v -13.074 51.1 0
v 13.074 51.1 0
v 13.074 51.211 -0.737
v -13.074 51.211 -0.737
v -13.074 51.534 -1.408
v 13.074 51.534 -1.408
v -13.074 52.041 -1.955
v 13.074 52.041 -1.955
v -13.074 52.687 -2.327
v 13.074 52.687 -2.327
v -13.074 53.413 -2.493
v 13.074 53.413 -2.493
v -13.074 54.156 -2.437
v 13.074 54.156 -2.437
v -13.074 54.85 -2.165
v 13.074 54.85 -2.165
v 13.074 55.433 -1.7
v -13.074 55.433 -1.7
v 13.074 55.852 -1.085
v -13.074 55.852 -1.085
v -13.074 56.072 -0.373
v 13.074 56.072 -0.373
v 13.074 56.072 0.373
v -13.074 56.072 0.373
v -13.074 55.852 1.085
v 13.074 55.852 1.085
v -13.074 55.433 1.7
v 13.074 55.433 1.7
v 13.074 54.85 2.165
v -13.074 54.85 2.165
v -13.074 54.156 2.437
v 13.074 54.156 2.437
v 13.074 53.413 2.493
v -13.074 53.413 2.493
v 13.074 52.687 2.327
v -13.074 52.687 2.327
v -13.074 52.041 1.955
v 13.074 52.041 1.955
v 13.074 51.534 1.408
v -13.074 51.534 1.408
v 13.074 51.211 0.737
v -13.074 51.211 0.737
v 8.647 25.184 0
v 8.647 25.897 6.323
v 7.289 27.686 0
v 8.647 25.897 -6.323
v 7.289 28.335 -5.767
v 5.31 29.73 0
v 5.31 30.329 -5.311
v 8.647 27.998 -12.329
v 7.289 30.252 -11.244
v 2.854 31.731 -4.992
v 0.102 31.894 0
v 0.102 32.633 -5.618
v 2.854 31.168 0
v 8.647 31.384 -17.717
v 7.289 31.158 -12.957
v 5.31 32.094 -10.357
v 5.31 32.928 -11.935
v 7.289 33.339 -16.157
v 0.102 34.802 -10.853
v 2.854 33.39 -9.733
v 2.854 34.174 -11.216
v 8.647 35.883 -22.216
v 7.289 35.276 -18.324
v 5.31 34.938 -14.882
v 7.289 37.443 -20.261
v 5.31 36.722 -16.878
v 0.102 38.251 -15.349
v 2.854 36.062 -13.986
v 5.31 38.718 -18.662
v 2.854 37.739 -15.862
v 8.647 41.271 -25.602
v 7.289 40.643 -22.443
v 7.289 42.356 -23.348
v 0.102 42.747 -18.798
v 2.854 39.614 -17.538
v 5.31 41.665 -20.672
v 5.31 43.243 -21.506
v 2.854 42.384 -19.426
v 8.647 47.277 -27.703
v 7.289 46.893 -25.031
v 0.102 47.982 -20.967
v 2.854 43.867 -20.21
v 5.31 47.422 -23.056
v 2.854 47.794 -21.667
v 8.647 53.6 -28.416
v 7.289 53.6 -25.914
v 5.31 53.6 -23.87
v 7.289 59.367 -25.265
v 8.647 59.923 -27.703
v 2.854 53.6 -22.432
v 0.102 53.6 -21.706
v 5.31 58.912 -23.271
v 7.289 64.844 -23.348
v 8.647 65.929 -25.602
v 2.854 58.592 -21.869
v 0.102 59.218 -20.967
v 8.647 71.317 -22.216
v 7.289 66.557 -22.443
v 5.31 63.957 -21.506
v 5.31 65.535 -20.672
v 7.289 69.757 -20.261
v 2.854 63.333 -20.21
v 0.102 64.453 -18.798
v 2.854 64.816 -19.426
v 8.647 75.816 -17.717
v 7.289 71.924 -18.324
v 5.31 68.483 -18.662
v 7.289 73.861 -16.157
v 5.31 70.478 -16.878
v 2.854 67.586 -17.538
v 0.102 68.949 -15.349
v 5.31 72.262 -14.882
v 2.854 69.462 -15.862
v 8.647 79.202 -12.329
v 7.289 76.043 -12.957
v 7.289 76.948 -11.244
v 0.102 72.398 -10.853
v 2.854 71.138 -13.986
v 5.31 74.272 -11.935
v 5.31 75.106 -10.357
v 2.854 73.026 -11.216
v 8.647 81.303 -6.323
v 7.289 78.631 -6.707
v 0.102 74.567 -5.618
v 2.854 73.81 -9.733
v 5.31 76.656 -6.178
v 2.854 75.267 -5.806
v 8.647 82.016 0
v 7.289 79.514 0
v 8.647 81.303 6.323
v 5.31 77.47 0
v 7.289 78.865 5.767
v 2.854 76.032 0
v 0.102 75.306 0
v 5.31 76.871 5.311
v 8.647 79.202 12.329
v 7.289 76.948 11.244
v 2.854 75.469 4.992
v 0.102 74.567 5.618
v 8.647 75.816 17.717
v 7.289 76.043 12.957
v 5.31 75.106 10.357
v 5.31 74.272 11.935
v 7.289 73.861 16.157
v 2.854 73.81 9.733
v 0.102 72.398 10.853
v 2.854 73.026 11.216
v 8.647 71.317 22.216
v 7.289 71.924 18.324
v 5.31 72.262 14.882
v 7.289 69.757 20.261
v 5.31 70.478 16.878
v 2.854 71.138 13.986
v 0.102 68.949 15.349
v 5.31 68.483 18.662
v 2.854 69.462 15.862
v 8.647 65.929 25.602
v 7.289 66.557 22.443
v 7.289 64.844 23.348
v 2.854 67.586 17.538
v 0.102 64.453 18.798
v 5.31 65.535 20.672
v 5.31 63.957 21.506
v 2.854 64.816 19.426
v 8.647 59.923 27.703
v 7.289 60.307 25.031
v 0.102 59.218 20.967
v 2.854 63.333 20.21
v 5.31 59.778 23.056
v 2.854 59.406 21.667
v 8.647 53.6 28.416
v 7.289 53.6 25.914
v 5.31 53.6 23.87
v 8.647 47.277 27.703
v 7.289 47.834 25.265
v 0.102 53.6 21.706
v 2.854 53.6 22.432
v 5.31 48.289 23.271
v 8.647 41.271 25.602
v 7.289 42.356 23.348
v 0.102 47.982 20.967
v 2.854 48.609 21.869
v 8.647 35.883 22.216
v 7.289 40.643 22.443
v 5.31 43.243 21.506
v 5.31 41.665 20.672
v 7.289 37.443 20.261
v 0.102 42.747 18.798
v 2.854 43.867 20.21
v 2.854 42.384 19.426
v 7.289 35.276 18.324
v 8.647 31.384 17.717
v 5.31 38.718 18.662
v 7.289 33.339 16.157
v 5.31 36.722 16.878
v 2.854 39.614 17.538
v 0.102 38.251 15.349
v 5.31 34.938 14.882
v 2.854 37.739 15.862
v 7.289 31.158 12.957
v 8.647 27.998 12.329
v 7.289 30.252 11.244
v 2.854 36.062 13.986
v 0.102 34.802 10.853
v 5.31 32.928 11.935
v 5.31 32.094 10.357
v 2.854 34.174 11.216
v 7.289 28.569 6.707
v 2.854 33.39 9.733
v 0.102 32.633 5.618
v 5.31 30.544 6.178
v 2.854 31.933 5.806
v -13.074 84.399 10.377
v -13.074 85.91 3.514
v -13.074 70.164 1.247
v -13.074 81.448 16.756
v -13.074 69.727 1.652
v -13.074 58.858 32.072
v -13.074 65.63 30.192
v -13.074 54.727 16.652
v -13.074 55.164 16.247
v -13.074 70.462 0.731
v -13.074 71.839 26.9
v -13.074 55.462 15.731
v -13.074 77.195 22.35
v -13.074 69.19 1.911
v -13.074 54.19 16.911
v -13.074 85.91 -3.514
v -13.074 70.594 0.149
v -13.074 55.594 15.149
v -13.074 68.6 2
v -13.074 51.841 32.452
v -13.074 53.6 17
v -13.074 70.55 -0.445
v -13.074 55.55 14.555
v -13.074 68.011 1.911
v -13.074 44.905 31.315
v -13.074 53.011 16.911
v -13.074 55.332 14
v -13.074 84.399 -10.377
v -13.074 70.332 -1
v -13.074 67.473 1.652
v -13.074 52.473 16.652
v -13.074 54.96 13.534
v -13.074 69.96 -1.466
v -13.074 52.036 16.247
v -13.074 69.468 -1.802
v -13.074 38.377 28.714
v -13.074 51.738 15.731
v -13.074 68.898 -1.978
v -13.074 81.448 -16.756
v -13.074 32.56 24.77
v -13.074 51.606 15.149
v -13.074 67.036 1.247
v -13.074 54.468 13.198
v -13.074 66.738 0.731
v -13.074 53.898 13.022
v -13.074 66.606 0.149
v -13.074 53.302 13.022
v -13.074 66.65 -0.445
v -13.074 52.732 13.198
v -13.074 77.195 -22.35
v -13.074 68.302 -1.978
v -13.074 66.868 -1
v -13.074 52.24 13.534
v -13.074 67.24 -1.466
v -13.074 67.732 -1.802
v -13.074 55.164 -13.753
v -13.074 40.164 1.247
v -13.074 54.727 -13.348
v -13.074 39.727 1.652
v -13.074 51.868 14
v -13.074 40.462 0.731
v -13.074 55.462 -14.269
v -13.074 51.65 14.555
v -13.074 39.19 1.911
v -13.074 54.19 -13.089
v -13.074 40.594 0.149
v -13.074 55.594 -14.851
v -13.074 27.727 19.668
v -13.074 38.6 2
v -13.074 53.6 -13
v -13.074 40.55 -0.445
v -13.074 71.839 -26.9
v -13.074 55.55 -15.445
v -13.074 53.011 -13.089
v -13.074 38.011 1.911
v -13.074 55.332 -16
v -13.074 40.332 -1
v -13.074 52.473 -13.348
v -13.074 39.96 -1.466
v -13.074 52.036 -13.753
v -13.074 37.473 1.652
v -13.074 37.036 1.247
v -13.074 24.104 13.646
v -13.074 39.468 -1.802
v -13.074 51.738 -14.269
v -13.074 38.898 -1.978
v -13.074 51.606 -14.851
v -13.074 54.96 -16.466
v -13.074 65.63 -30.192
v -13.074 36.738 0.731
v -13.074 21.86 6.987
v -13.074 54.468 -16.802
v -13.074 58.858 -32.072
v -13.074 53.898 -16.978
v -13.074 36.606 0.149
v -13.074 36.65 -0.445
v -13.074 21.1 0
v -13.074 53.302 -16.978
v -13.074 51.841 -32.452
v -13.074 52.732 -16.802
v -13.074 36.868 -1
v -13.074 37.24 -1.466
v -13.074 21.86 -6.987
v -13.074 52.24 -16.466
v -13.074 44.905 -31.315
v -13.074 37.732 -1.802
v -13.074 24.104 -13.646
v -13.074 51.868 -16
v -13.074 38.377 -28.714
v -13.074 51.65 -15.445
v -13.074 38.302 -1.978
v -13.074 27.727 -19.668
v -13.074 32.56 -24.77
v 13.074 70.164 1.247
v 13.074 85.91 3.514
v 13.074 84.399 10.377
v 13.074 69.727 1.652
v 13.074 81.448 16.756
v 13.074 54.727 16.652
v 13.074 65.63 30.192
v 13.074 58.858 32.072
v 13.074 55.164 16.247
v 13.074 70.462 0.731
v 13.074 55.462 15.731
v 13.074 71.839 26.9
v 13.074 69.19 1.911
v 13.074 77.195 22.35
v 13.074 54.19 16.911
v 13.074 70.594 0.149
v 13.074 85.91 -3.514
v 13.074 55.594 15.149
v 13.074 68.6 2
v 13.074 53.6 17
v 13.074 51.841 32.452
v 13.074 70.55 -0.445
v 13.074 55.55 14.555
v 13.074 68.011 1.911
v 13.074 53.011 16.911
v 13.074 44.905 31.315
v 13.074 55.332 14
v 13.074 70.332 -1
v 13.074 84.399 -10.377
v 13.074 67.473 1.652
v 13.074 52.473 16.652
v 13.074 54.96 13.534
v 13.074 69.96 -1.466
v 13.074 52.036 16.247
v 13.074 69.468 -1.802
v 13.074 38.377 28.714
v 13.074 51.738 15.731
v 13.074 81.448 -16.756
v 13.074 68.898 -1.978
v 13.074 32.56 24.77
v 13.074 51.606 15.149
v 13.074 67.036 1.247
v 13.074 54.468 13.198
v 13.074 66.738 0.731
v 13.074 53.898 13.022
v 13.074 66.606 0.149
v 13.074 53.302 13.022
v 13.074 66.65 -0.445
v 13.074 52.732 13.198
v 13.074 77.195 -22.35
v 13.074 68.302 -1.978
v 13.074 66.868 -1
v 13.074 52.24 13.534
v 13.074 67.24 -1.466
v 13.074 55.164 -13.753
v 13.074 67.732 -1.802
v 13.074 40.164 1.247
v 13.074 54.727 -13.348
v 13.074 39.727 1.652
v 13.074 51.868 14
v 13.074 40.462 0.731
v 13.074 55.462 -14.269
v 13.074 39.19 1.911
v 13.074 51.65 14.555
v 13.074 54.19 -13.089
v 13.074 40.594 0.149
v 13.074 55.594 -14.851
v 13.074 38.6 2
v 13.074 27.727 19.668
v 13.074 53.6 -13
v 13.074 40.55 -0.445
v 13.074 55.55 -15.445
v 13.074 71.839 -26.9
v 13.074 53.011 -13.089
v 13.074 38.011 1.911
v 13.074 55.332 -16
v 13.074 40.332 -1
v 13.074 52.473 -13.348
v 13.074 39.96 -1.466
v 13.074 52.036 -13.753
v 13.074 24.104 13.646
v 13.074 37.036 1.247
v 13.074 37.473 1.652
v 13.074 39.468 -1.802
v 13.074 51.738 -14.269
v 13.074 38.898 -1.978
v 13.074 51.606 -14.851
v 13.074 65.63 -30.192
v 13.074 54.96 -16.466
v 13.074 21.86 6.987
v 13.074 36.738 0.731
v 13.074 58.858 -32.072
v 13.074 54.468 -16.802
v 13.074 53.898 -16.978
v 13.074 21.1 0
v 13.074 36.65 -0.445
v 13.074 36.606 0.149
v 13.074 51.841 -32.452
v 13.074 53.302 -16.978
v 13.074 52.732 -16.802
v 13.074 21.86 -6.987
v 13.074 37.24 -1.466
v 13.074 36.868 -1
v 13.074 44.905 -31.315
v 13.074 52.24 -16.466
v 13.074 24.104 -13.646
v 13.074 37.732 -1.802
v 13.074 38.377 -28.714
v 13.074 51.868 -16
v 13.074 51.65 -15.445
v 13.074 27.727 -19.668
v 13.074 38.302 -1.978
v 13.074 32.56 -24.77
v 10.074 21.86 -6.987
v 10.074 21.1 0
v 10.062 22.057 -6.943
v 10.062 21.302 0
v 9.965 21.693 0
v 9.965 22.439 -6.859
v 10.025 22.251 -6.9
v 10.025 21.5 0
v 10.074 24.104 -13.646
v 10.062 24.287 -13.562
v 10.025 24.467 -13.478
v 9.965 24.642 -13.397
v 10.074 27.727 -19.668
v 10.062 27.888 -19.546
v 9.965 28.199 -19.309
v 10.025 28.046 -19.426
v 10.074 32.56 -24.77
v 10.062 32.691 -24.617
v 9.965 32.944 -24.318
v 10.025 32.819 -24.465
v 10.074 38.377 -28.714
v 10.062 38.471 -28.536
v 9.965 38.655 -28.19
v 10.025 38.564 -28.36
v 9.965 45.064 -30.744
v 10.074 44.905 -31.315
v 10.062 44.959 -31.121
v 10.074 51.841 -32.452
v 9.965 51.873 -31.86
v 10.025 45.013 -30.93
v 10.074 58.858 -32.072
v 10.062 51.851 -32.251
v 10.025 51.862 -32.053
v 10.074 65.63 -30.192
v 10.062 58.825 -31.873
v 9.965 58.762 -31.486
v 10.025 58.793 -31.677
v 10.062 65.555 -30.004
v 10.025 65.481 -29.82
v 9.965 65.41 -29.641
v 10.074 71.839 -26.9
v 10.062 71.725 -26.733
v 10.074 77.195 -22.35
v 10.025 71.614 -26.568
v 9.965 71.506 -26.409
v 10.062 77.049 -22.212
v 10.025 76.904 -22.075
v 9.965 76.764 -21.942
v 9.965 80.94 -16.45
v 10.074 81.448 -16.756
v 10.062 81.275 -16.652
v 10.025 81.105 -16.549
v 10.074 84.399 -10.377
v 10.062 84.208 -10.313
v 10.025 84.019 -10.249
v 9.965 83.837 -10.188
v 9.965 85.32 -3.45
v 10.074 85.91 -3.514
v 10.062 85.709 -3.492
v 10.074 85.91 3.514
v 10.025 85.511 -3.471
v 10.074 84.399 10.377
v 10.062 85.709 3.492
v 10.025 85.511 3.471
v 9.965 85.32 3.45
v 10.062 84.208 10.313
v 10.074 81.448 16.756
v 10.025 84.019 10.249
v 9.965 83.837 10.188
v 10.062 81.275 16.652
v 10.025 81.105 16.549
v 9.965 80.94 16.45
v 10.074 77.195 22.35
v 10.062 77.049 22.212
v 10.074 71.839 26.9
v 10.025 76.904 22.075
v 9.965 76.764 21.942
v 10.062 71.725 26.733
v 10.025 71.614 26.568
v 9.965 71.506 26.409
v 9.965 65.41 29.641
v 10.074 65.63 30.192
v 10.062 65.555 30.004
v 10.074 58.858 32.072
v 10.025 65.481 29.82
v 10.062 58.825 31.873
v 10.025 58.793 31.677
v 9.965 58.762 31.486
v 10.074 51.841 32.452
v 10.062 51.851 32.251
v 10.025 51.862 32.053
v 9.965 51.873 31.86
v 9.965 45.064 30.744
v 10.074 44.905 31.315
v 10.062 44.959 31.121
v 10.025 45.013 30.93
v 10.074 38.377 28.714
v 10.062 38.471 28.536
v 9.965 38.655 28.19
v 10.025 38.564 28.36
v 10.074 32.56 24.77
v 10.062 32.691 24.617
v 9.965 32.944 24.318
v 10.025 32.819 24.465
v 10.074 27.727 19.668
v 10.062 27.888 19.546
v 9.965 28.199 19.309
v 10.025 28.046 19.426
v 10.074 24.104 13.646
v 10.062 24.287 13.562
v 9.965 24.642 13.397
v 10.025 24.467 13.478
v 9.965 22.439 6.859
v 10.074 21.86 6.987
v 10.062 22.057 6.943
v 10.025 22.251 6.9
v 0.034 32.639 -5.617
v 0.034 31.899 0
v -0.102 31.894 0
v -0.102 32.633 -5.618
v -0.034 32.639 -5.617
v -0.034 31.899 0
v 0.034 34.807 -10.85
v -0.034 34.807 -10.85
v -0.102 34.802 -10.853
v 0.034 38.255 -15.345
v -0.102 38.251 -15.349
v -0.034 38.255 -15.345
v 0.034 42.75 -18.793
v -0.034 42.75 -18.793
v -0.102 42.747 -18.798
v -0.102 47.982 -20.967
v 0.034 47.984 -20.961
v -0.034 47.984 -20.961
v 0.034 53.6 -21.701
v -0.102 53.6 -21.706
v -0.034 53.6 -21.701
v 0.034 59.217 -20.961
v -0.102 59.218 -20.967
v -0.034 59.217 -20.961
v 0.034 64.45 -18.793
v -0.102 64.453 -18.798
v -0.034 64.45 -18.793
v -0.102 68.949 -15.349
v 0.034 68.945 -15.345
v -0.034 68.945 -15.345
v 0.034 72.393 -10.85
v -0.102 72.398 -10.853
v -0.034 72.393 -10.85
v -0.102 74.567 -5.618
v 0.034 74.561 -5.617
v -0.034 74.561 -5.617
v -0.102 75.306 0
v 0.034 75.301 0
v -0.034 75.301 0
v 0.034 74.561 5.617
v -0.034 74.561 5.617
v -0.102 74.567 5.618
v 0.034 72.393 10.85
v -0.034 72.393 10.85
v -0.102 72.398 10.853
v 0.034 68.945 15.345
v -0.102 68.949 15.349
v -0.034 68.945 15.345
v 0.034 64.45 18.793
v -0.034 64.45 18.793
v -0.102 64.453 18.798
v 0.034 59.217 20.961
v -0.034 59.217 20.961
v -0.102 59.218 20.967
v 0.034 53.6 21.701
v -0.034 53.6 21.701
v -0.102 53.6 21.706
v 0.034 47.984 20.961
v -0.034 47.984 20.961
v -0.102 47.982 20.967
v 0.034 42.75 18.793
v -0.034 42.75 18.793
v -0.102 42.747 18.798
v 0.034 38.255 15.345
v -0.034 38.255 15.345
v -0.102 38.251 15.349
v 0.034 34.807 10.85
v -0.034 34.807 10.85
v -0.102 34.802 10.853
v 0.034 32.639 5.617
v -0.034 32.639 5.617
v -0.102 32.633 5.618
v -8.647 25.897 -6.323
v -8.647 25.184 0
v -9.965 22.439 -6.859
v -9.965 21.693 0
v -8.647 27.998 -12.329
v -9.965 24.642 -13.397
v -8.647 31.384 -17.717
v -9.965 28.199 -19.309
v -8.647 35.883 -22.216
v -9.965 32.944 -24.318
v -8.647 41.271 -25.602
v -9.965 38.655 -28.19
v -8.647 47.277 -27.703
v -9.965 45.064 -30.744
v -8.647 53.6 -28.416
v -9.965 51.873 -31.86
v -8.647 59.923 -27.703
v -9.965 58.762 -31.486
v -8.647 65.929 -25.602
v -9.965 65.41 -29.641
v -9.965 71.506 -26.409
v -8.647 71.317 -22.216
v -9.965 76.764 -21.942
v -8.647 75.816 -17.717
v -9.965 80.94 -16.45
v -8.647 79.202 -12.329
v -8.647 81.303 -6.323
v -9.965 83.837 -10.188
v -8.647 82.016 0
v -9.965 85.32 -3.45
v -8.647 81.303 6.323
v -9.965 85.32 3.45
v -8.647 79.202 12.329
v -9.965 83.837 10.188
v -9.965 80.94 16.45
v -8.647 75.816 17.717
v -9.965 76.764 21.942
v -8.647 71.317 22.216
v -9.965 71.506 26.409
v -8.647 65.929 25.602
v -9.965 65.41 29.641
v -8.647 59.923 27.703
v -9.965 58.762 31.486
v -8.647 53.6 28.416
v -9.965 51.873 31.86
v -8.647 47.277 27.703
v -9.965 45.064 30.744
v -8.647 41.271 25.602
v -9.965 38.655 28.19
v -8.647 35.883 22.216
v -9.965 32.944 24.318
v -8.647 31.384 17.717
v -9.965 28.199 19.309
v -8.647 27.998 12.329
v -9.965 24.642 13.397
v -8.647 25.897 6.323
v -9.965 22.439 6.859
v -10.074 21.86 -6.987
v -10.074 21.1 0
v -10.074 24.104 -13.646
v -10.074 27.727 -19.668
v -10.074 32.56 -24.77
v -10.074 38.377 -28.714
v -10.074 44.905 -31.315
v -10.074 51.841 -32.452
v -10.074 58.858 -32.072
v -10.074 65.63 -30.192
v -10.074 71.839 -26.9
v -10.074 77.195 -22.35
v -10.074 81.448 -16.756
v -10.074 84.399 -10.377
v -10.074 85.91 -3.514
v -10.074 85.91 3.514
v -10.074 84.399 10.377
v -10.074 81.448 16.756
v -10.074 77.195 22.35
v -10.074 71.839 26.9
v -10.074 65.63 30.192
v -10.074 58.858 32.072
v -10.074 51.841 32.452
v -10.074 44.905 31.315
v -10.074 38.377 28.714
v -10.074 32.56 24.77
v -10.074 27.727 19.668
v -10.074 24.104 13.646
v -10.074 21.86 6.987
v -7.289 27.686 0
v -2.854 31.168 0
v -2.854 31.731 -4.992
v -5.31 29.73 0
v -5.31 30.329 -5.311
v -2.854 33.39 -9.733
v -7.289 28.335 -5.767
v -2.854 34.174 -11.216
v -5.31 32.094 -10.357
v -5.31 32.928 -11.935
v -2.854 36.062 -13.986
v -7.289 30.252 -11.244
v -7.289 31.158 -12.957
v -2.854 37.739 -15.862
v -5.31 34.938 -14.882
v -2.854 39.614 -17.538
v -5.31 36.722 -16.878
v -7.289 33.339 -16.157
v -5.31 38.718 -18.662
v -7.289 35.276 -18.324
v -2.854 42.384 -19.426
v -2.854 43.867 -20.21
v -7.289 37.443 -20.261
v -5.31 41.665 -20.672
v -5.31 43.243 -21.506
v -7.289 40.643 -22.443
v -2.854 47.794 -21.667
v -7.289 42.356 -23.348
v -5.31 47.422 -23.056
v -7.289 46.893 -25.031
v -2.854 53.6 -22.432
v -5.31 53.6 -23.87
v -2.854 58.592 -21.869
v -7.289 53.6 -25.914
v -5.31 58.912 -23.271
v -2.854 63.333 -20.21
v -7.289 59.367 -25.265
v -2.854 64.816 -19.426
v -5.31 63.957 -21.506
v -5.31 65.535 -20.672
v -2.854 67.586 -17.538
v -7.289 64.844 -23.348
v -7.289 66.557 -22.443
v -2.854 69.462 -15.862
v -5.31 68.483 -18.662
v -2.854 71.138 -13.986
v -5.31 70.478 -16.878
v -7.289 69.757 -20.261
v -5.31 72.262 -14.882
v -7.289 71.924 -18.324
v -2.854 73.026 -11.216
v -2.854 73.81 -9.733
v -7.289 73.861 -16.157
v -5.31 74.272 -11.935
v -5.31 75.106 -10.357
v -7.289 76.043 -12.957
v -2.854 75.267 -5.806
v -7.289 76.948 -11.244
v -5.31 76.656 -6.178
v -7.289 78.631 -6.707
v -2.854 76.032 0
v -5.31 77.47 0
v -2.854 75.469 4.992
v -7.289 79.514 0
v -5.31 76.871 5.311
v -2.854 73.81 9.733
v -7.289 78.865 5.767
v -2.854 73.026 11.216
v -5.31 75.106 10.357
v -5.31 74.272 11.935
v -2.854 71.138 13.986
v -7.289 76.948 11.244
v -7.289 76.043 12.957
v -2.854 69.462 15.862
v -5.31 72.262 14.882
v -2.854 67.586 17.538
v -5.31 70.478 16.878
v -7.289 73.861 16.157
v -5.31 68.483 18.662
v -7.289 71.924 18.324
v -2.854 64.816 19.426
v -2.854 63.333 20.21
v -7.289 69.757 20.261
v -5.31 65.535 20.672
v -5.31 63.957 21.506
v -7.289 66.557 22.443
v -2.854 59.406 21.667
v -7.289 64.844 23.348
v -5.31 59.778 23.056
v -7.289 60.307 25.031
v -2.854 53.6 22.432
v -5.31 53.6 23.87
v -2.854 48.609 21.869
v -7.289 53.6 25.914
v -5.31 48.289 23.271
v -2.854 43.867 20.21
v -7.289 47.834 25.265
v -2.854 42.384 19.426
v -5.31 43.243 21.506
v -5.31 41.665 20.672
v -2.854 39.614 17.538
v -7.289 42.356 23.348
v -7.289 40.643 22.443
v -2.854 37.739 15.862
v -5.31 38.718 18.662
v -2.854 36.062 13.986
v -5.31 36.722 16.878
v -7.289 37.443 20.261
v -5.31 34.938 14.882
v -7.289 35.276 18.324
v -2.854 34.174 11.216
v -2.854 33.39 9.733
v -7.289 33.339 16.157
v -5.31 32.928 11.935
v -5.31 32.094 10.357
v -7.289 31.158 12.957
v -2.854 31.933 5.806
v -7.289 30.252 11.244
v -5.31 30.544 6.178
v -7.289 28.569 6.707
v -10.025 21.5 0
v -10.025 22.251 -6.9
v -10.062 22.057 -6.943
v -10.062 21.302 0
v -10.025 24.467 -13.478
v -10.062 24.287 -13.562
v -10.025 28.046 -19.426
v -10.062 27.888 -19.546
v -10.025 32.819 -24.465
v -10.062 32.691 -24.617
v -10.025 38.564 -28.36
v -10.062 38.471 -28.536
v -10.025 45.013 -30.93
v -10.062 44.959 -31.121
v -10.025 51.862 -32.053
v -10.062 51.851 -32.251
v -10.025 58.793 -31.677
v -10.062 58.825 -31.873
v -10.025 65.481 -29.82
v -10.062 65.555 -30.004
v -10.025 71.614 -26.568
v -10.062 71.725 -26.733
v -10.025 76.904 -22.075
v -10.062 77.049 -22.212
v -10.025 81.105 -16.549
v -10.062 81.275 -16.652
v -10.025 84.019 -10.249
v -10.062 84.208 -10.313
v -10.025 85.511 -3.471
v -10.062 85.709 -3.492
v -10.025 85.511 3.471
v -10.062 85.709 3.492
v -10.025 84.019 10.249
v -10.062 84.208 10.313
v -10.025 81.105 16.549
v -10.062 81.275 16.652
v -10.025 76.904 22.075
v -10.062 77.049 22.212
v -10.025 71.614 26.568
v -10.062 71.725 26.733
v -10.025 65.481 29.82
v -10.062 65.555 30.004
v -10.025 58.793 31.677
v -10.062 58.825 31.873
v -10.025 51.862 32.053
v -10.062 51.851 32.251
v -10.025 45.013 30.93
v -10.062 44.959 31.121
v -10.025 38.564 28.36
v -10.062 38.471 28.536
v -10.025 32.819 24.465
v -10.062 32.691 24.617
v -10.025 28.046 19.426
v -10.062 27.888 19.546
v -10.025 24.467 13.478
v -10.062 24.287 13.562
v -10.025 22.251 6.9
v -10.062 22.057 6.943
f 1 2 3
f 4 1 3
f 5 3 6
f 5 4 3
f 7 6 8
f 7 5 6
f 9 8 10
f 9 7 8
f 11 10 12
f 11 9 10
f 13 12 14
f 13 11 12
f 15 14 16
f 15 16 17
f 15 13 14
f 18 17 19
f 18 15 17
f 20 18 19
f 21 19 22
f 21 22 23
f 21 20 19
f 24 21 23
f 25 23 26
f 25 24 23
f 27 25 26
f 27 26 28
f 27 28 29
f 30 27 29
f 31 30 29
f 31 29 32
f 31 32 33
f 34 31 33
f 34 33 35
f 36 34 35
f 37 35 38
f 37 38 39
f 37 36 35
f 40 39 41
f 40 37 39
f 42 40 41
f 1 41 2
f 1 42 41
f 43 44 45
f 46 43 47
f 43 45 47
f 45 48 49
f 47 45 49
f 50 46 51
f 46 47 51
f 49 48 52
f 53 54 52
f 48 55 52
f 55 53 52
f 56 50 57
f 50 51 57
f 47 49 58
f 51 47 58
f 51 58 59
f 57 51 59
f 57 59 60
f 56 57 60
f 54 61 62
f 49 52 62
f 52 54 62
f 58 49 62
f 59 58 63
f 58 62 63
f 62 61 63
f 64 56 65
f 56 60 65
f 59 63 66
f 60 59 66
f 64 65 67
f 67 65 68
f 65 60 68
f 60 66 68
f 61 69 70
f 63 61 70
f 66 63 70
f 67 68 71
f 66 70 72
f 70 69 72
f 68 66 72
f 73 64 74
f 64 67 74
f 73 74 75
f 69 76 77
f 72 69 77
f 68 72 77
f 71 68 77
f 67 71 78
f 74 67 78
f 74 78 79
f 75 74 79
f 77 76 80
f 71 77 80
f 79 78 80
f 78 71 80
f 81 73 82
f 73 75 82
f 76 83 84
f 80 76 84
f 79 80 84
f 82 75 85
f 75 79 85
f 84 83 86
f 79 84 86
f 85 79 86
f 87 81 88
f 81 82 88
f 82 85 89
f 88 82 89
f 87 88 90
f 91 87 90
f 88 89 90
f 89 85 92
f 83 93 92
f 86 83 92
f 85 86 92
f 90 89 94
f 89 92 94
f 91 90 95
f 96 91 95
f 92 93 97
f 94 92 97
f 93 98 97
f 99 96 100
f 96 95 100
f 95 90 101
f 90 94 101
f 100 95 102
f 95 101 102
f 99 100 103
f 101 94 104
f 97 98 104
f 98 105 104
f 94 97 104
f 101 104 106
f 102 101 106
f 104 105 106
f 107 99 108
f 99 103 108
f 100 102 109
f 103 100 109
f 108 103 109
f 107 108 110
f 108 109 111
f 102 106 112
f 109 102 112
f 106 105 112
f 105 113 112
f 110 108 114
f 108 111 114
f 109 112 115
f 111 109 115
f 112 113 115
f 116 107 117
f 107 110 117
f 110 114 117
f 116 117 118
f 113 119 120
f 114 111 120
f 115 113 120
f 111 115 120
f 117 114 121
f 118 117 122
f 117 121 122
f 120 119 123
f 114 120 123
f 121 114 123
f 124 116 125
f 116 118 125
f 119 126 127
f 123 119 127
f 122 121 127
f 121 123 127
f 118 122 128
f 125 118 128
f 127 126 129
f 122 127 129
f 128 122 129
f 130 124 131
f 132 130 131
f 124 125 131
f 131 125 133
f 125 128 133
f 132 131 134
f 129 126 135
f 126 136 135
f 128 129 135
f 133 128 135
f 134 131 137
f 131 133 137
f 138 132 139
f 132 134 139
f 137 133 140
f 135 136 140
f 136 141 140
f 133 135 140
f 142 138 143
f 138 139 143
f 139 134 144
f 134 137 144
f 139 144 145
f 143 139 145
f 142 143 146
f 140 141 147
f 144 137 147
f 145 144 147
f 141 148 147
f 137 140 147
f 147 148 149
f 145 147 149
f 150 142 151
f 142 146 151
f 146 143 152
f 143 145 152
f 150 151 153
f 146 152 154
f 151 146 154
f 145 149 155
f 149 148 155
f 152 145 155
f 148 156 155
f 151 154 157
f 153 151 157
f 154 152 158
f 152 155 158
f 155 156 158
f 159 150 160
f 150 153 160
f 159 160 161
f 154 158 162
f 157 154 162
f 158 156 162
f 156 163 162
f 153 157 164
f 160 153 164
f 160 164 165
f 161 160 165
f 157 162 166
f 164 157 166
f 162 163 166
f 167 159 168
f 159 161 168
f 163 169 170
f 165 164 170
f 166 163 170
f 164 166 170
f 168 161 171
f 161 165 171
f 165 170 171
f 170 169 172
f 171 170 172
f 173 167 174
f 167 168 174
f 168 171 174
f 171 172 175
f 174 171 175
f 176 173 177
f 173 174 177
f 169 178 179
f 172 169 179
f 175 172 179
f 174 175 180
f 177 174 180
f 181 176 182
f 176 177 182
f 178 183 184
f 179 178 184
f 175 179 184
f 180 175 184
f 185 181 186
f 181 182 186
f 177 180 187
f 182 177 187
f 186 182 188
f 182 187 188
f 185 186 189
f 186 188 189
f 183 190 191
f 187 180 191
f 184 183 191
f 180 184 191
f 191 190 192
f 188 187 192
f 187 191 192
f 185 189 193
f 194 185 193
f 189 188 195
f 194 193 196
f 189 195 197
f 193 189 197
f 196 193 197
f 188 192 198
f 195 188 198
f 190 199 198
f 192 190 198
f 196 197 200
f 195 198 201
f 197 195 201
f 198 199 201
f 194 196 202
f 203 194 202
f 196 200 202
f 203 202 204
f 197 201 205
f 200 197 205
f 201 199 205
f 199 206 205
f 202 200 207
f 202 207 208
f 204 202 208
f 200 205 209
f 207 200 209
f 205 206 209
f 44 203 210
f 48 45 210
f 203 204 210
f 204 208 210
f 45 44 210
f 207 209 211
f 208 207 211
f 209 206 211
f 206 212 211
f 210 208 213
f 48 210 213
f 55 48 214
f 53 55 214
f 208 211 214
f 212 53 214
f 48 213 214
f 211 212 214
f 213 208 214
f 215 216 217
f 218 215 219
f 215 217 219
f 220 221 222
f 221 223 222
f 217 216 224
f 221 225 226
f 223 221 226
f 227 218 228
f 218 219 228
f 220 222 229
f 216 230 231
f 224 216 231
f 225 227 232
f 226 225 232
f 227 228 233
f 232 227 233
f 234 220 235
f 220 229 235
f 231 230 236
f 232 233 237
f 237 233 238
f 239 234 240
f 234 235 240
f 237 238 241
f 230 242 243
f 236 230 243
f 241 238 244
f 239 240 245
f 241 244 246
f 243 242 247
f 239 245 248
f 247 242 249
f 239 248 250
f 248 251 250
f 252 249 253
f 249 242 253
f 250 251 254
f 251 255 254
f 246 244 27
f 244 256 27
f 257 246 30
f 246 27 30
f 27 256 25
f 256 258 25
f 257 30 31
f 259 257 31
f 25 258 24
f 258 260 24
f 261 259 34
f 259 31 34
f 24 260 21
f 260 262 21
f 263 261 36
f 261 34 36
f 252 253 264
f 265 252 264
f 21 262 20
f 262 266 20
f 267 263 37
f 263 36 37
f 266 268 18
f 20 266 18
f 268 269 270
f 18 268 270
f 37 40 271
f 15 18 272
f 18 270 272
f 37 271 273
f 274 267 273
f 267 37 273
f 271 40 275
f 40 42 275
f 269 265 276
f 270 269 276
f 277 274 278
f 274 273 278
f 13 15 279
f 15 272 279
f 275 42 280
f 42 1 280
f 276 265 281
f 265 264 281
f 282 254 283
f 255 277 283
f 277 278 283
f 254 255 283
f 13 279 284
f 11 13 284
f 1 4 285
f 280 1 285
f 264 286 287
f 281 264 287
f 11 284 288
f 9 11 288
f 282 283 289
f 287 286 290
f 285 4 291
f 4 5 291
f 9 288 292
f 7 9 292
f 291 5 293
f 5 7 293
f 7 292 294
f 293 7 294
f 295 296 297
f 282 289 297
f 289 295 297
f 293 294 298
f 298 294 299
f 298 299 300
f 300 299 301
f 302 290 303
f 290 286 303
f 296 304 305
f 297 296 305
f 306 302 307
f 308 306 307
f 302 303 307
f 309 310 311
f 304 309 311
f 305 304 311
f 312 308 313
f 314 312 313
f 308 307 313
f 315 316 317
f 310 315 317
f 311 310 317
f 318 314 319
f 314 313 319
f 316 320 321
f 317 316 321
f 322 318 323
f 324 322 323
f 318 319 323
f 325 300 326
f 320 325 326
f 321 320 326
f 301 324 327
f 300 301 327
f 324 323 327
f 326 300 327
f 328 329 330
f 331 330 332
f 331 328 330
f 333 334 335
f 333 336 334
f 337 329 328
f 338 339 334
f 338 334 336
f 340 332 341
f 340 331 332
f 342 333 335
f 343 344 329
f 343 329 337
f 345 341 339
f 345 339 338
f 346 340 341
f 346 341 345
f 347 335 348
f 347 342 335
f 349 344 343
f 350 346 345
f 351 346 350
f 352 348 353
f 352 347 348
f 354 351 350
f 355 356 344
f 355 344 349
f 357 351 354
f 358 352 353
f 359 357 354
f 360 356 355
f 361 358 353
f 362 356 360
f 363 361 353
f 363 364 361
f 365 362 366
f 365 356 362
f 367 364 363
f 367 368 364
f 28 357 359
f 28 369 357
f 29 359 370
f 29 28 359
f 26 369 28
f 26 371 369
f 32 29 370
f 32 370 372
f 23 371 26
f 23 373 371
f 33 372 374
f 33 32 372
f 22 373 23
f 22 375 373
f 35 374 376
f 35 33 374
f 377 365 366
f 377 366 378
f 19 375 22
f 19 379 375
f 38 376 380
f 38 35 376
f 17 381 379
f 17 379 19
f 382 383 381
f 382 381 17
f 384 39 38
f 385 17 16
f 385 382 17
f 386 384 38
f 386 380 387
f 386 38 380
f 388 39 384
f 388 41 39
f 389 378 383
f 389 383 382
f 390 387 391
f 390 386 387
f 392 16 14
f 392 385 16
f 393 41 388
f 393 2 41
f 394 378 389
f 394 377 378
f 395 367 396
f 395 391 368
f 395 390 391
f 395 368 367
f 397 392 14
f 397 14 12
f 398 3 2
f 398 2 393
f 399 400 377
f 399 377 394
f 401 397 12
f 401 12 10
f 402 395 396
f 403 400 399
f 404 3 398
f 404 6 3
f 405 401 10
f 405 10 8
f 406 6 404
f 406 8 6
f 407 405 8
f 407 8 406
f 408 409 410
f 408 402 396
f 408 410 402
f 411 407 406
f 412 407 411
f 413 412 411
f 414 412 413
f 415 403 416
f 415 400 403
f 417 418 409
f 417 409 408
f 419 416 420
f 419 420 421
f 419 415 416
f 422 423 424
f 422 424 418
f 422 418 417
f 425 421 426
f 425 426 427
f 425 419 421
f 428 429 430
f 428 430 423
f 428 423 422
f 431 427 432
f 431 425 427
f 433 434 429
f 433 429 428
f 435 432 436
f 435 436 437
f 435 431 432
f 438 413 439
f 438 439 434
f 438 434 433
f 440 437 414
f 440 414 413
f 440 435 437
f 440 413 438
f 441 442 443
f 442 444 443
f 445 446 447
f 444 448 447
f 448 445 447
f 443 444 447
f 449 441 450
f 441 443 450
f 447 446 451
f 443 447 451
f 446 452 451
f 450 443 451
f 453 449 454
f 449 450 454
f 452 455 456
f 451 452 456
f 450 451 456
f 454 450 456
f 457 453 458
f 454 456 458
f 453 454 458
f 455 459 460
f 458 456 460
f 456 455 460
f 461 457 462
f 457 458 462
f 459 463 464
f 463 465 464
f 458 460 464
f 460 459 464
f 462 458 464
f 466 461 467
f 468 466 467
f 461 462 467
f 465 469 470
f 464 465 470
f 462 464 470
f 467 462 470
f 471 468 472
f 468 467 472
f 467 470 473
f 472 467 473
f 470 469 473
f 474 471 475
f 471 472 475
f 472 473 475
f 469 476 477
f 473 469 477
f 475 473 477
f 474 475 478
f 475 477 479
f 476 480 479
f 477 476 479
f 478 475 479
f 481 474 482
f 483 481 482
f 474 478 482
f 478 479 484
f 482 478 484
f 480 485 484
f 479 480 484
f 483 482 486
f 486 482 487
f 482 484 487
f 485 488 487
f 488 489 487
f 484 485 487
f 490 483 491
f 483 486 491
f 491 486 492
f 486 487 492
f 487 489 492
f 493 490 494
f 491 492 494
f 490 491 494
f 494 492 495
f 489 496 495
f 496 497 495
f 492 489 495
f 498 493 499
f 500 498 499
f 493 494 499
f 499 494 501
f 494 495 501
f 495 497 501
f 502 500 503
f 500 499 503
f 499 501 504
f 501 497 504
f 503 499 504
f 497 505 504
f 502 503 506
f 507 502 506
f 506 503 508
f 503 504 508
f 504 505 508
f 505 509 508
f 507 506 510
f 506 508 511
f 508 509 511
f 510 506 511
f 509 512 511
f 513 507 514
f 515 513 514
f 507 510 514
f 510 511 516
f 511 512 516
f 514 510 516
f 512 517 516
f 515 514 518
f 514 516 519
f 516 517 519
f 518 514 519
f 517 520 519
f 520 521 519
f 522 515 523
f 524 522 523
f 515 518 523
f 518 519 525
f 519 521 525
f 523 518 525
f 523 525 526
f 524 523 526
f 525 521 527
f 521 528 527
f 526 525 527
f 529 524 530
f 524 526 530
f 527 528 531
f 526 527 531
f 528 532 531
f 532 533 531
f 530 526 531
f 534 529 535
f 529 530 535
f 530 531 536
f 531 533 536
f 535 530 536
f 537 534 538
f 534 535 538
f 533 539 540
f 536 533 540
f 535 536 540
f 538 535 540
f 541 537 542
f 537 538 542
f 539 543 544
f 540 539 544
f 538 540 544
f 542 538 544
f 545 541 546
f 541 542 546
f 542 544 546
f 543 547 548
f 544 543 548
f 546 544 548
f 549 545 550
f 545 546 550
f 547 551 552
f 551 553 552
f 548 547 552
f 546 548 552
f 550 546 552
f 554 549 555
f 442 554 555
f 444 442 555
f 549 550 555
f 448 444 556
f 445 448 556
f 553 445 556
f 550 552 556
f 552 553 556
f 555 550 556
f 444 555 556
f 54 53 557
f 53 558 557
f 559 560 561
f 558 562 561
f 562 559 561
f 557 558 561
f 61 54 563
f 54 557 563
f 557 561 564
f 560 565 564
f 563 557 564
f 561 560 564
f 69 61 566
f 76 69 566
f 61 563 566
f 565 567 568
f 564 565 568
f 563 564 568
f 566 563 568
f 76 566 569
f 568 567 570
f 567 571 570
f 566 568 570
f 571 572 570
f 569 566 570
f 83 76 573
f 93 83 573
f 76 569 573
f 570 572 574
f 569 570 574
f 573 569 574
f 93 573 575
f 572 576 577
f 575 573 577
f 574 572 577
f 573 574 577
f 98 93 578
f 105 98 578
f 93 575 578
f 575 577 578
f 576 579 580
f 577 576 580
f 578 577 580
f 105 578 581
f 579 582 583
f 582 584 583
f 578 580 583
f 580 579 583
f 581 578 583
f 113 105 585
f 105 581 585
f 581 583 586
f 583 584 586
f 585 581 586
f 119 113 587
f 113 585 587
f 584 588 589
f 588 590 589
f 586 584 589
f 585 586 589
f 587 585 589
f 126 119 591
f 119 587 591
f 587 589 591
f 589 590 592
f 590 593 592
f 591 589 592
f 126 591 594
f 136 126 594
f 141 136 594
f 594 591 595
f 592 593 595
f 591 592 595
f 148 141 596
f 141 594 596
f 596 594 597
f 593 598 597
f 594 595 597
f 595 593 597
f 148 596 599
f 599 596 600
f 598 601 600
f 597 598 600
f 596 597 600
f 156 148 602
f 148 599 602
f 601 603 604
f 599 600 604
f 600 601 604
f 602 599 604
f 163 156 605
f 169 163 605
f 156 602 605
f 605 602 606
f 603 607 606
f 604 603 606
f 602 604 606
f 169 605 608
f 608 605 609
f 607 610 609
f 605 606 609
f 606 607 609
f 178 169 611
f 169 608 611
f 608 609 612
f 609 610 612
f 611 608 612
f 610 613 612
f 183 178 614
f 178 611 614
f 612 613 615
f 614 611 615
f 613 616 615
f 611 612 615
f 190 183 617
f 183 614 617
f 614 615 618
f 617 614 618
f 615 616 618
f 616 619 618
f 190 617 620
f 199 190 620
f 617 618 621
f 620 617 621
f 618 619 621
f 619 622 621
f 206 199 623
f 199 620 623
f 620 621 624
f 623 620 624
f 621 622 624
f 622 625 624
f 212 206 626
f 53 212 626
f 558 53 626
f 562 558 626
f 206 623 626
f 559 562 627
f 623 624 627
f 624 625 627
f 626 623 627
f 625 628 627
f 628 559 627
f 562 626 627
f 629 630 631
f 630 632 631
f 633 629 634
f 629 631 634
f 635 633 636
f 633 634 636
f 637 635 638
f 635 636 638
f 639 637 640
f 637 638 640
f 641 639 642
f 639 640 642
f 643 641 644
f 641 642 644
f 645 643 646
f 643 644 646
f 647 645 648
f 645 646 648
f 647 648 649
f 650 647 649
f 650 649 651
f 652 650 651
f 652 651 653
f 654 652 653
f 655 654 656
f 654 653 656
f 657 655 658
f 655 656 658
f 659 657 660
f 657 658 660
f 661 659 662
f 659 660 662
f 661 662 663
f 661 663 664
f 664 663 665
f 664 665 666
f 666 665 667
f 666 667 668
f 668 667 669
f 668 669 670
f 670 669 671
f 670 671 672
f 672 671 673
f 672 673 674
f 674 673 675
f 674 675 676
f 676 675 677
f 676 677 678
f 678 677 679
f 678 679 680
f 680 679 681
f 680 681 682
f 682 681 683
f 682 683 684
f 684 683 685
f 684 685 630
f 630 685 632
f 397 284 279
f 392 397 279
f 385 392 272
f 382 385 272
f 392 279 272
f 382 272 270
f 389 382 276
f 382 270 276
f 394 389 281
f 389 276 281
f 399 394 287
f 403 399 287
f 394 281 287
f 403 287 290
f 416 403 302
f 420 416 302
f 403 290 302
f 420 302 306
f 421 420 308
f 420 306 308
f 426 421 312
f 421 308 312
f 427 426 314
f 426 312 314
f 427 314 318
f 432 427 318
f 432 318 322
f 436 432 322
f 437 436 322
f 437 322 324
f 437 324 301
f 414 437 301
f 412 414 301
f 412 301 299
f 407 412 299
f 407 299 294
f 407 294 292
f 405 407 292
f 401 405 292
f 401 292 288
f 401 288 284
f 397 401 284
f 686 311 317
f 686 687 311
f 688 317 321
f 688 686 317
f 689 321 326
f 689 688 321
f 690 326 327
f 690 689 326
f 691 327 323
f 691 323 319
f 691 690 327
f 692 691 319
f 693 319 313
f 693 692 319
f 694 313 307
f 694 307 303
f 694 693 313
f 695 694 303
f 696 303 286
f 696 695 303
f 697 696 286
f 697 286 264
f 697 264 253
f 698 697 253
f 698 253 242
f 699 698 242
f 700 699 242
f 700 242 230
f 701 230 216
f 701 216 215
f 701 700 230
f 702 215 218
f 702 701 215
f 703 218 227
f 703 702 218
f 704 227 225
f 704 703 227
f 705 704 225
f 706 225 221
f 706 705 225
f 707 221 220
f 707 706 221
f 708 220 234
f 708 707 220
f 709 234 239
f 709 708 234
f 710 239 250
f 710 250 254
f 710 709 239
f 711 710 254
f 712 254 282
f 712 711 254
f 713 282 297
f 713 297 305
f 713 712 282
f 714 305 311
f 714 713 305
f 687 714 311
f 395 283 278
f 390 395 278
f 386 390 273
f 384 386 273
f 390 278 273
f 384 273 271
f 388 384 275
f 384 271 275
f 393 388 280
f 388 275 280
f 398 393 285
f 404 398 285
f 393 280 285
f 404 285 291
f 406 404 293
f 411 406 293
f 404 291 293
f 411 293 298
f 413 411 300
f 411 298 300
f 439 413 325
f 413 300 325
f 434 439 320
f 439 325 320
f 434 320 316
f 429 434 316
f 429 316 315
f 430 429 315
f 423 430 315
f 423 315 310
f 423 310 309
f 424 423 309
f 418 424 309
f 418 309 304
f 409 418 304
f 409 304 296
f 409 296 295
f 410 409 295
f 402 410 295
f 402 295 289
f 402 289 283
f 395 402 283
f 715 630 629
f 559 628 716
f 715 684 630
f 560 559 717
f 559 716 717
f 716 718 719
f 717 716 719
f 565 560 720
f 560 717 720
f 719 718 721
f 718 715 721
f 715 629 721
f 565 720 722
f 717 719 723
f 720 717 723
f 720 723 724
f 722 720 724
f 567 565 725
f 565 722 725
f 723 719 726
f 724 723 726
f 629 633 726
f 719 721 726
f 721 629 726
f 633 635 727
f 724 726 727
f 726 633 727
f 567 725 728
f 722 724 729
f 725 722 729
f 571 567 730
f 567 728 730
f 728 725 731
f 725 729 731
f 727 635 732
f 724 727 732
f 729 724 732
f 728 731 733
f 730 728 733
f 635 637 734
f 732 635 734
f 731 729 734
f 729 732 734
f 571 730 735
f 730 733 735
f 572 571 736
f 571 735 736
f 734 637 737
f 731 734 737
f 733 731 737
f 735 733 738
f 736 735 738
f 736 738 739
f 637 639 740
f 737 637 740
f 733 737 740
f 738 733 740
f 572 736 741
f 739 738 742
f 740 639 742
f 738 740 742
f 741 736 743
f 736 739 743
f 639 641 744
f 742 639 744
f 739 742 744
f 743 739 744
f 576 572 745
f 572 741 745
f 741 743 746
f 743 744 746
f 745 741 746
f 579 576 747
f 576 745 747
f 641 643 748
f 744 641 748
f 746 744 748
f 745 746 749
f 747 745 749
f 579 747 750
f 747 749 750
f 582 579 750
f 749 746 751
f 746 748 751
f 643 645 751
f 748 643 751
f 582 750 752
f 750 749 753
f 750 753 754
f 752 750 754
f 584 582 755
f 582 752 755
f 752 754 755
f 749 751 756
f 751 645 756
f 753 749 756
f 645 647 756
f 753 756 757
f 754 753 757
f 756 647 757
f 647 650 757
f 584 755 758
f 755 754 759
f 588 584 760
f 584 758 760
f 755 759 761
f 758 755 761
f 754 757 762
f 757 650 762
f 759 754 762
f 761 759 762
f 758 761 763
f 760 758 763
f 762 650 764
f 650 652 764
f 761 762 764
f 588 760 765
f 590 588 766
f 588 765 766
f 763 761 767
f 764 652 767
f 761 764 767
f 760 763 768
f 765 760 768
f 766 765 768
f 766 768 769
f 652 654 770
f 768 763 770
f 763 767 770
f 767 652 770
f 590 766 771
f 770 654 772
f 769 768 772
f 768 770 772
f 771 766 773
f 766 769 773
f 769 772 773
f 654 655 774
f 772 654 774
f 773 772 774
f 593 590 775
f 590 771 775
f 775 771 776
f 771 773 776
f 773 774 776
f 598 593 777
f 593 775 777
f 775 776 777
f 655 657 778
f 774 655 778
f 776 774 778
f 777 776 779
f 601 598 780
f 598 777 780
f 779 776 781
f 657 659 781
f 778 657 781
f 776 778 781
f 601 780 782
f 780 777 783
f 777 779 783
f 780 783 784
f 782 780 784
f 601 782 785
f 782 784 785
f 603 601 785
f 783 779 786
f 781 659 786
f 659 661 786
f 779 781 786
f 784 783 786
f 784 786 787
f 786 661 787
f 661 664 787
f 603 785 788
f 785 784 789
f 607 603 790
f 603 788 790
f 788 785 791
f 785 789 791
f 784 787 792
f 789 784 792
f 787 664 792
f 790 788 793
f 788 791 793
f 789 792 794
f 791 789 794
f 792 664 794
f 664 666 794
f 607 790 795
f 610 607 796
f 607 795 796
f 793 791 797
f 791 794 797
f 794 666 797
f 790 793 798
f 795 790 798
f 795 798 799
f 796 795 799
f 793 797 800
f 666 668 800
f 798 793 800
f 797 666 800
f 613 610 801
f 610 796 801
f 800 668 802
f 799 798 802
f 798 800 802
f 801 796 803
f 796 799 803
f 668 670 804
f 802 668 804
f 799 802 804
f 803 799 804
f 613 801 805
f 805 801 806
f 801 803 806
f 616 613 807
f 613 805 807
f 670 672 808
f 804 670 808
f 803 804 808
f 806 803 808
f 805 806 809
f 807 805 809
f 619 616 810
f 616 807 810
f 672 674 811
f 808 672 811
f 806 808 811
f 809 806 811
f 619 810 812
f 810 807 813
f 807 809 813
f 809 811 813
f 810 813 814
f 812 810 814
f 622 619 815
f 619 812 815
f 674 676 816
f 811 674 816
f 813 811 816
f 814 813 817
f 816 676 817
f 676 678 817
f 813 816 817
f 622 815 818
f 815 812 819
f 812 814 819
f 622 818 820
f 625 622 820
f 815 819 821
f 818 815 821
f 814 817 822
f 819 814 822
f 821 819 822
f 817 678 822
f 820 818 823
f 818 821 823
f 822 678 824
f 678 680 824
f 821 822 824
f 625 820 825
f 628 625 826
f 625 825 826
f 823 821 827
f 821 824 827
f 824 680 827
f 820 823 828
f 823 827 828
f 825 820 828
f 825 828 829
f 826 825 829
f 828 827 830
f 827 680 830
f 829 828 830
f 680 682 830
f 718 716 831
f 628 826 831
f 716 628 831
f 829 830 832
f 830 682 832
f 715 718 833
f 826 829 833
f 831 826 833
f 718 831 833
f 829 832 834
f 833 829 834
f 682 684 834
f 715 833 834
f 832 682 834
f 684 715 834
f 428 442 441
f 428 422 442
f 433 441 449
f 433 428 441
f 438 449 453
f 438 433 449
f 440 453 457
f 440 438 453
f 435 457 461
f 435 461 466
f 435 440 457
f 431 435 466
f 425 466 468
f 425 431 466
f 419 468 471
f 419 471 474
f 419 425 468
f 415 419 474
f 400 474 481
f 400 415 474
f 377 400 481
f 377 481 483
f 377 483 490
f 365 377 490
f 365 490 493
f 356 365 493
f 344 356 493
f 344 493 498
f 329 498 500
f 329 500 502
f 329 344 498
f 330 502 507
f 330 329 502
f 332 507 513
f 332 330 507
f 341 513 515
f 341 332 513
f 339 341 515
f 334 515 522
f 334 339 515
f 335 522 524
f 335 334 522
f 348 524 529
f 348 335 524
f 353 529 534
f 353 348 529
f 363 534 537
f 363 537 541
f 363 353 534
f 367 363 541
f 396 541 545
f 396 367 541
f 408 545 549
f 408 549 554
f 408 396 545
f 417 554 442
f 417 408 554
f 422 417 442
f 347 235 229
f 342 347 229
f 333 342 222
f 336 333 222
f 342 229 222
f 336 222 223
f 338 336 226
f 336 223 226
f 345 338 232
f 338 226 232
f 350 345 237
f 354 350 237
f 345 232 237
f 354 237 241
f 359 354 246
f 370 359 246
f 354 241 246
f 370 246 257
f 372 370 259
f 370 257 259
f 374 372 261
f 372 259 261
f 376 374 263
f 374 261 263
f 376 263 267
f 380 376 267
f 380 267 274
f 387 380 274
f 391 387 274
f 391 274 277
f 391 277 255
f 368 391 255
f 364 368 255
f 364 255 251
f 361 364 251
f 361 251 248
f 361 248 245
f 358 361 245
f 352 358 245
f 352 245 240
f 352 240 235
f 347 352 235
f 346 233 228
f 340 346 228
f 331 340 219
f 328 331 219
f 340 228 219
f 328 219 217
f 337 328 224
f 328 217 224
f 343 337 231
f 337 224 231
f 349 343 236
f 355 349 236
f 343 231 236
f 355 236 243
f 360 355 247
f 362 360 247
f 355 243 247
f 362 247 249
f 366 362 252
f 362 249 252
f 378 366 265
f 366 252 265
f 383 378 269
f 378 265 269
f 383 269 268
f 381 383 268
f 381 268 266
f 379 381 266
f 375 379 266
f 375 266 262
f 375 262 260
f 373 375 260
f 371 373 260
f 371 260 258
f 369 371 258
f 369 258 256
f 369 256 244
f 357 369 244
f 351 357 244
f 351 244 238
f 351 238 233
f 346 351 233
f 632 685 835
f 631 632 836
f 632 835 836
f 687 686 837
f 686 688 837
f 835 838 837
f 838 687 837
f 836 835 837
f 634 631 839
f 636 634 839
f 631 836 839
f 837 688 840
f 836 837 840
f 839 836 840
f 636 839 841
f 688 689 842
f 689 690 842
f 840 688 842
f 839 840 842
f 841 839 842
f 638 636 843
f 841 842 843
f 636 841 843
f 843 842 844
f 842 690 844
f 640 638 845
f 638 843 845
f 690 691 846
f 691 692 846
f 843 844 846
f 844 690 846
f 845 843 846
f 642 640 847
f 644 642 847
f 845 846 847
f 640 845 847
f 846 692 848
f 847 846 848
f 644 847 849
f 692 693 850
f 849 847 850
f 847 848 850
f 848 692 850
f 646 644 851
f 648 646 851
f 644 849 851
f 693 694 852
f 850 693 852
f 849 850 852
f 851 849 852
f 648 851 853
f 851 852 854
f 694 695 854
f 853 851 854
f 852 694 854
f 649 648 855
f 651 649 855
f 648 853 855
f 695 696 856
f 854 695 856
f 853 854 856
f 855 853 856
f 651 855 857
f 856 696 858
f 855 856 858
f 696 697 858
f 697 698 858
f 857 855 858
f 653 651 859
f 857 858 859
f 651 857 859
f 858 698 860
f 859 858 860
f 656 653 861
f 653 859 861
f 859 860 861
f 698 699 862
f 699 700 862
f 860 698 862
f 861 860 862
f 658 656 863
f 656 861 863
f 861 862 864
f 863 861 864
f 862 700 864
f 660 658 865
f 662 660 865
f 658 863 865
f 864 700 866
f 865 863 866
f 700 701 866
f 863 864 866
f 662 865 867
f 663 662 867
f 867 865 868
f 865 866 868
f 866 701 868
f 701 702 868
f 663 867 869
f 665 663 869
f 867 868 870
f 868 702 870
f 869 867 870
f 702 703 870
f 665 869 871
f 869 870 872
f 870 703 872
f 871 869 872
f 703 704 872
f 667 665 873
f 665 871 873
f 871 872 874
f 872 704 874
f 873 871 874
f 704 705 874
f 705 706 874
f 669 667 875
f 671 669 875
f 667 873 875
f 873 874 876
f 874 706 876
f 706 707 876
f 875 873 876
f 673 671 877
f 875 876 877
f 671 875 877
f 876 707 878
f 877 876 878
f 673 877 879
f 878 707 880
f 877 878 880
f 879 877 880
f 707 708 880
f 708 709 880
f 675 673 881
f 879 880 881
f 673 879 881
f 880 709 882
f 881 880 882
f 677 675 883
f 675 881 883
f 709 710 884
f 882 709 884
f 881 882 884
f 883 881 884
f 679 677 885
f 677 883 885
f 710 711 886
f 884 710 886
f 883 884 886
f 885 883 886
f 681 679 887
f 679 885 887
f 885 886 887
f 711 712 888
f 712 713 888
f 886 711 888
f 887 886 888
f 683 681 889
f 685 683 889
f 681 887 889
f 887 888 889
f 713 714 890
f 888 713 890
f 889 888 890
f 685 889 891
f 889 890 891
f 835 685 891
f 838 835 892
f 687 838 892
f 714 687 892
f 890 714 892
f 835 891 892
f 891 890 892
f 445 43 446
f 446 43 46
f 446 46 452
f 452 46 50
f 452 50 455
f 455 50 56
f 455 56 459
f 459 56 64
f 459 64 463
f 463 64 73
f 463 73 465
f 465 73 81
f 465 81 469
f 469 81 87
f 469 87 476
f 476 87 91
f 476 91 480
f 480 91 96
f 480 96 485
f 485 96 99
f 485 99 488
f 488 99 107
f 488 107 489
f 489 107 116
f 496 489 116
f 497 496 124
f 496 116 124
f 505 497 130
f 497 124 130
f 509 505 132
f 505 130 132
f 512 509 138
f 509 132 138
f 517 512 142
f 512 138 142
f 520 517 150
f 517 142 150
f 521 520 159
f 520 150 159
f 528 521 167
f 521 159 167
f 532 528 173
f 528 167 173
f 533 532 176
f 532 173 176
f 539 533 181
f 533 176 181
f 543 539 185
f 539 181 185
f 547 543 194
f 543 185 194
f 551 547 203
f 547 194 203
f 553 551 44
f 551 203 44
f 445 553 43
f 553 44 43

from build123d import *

# Parameters (mm, degrees)
SKETCH1_W          = 3
SKETCH1_H          = 30
SKETCH2_R          = 2
CUT_EXTRUDE1_DEPTH = 31


with BuildPart() as part:
    # Sketch1 → Revolve1 (revolve)
    with BuildSketch(Plane.XY):
        with BuildLine():
            ThreePointArc((0.101961368, 31.893841841), (0, 31.900056883), (-0.101961368, 31.893841841))
            ThreePointArc((-0.101961368, 31.893841841), (-5.309821172, 29.73045951), (-8.646594366, 25.184255434))
            Line((-8.646594366, 25.184255434), (-9.965363022, 21.693397226))
            ThreePointArc((-9.965363022, 21.693397226), (-10.046395323, 21.401631123), (-10.073702174, 21.100055213))
            Line((-10.073702174, 21.100055213), (-10.073702174, 51.100055213))
            Line((-10.073702174, 51.100055213), (10.073702174, 51.100055213))
            Line((10.073702174, 51.100055213), (10.073702174, 21.100055213))
            ThreePointArc((10.073702174, 21.100055213), (10.046395323, 21.401631123), (9.965363022, 21.693397226))
            Line((9.965363022, 21.693397226), (8.646594366, 25.184255434))
            ThreePointArc((8.646594366, 25.184255434), (5.309821172, 29.73045951), (0.101961368, 31.893841841))
        make_face()
        with Locations((-11.573702174, 36.100055213)):
            Rectangle(SKETCH1_W, SKETCH1_H)
        with Locations((11.573702174, 36.100055213)):
            Rectangle(SKETCH1_W, SKETCH1_H)
    revolve(axis=Axis((-31.343058989, 53.600055213, 0), (1, 0, 0)))

    # Sketch2 → Cut-Extrude1 (cut)
    with BuildSketch(Plane.ZY.offset(13.073702174)):
        with Locations((0, 68.600055213)):
            Circle(SKETCH2_R)
        with Locations((15, 53.600055213)):
            Circle(SKETCH2_R)
        with Locations((0, 38.600055213)):
            Circle(SKETCH2_R)
        with Locations((-15, 53.600055213)):
            Circle(SKETCH2_R)
    extrude(amount=-CUT_EXTRUDE1_DEPTH, mode=Mode.SUBTRACT)


solid = part.part
